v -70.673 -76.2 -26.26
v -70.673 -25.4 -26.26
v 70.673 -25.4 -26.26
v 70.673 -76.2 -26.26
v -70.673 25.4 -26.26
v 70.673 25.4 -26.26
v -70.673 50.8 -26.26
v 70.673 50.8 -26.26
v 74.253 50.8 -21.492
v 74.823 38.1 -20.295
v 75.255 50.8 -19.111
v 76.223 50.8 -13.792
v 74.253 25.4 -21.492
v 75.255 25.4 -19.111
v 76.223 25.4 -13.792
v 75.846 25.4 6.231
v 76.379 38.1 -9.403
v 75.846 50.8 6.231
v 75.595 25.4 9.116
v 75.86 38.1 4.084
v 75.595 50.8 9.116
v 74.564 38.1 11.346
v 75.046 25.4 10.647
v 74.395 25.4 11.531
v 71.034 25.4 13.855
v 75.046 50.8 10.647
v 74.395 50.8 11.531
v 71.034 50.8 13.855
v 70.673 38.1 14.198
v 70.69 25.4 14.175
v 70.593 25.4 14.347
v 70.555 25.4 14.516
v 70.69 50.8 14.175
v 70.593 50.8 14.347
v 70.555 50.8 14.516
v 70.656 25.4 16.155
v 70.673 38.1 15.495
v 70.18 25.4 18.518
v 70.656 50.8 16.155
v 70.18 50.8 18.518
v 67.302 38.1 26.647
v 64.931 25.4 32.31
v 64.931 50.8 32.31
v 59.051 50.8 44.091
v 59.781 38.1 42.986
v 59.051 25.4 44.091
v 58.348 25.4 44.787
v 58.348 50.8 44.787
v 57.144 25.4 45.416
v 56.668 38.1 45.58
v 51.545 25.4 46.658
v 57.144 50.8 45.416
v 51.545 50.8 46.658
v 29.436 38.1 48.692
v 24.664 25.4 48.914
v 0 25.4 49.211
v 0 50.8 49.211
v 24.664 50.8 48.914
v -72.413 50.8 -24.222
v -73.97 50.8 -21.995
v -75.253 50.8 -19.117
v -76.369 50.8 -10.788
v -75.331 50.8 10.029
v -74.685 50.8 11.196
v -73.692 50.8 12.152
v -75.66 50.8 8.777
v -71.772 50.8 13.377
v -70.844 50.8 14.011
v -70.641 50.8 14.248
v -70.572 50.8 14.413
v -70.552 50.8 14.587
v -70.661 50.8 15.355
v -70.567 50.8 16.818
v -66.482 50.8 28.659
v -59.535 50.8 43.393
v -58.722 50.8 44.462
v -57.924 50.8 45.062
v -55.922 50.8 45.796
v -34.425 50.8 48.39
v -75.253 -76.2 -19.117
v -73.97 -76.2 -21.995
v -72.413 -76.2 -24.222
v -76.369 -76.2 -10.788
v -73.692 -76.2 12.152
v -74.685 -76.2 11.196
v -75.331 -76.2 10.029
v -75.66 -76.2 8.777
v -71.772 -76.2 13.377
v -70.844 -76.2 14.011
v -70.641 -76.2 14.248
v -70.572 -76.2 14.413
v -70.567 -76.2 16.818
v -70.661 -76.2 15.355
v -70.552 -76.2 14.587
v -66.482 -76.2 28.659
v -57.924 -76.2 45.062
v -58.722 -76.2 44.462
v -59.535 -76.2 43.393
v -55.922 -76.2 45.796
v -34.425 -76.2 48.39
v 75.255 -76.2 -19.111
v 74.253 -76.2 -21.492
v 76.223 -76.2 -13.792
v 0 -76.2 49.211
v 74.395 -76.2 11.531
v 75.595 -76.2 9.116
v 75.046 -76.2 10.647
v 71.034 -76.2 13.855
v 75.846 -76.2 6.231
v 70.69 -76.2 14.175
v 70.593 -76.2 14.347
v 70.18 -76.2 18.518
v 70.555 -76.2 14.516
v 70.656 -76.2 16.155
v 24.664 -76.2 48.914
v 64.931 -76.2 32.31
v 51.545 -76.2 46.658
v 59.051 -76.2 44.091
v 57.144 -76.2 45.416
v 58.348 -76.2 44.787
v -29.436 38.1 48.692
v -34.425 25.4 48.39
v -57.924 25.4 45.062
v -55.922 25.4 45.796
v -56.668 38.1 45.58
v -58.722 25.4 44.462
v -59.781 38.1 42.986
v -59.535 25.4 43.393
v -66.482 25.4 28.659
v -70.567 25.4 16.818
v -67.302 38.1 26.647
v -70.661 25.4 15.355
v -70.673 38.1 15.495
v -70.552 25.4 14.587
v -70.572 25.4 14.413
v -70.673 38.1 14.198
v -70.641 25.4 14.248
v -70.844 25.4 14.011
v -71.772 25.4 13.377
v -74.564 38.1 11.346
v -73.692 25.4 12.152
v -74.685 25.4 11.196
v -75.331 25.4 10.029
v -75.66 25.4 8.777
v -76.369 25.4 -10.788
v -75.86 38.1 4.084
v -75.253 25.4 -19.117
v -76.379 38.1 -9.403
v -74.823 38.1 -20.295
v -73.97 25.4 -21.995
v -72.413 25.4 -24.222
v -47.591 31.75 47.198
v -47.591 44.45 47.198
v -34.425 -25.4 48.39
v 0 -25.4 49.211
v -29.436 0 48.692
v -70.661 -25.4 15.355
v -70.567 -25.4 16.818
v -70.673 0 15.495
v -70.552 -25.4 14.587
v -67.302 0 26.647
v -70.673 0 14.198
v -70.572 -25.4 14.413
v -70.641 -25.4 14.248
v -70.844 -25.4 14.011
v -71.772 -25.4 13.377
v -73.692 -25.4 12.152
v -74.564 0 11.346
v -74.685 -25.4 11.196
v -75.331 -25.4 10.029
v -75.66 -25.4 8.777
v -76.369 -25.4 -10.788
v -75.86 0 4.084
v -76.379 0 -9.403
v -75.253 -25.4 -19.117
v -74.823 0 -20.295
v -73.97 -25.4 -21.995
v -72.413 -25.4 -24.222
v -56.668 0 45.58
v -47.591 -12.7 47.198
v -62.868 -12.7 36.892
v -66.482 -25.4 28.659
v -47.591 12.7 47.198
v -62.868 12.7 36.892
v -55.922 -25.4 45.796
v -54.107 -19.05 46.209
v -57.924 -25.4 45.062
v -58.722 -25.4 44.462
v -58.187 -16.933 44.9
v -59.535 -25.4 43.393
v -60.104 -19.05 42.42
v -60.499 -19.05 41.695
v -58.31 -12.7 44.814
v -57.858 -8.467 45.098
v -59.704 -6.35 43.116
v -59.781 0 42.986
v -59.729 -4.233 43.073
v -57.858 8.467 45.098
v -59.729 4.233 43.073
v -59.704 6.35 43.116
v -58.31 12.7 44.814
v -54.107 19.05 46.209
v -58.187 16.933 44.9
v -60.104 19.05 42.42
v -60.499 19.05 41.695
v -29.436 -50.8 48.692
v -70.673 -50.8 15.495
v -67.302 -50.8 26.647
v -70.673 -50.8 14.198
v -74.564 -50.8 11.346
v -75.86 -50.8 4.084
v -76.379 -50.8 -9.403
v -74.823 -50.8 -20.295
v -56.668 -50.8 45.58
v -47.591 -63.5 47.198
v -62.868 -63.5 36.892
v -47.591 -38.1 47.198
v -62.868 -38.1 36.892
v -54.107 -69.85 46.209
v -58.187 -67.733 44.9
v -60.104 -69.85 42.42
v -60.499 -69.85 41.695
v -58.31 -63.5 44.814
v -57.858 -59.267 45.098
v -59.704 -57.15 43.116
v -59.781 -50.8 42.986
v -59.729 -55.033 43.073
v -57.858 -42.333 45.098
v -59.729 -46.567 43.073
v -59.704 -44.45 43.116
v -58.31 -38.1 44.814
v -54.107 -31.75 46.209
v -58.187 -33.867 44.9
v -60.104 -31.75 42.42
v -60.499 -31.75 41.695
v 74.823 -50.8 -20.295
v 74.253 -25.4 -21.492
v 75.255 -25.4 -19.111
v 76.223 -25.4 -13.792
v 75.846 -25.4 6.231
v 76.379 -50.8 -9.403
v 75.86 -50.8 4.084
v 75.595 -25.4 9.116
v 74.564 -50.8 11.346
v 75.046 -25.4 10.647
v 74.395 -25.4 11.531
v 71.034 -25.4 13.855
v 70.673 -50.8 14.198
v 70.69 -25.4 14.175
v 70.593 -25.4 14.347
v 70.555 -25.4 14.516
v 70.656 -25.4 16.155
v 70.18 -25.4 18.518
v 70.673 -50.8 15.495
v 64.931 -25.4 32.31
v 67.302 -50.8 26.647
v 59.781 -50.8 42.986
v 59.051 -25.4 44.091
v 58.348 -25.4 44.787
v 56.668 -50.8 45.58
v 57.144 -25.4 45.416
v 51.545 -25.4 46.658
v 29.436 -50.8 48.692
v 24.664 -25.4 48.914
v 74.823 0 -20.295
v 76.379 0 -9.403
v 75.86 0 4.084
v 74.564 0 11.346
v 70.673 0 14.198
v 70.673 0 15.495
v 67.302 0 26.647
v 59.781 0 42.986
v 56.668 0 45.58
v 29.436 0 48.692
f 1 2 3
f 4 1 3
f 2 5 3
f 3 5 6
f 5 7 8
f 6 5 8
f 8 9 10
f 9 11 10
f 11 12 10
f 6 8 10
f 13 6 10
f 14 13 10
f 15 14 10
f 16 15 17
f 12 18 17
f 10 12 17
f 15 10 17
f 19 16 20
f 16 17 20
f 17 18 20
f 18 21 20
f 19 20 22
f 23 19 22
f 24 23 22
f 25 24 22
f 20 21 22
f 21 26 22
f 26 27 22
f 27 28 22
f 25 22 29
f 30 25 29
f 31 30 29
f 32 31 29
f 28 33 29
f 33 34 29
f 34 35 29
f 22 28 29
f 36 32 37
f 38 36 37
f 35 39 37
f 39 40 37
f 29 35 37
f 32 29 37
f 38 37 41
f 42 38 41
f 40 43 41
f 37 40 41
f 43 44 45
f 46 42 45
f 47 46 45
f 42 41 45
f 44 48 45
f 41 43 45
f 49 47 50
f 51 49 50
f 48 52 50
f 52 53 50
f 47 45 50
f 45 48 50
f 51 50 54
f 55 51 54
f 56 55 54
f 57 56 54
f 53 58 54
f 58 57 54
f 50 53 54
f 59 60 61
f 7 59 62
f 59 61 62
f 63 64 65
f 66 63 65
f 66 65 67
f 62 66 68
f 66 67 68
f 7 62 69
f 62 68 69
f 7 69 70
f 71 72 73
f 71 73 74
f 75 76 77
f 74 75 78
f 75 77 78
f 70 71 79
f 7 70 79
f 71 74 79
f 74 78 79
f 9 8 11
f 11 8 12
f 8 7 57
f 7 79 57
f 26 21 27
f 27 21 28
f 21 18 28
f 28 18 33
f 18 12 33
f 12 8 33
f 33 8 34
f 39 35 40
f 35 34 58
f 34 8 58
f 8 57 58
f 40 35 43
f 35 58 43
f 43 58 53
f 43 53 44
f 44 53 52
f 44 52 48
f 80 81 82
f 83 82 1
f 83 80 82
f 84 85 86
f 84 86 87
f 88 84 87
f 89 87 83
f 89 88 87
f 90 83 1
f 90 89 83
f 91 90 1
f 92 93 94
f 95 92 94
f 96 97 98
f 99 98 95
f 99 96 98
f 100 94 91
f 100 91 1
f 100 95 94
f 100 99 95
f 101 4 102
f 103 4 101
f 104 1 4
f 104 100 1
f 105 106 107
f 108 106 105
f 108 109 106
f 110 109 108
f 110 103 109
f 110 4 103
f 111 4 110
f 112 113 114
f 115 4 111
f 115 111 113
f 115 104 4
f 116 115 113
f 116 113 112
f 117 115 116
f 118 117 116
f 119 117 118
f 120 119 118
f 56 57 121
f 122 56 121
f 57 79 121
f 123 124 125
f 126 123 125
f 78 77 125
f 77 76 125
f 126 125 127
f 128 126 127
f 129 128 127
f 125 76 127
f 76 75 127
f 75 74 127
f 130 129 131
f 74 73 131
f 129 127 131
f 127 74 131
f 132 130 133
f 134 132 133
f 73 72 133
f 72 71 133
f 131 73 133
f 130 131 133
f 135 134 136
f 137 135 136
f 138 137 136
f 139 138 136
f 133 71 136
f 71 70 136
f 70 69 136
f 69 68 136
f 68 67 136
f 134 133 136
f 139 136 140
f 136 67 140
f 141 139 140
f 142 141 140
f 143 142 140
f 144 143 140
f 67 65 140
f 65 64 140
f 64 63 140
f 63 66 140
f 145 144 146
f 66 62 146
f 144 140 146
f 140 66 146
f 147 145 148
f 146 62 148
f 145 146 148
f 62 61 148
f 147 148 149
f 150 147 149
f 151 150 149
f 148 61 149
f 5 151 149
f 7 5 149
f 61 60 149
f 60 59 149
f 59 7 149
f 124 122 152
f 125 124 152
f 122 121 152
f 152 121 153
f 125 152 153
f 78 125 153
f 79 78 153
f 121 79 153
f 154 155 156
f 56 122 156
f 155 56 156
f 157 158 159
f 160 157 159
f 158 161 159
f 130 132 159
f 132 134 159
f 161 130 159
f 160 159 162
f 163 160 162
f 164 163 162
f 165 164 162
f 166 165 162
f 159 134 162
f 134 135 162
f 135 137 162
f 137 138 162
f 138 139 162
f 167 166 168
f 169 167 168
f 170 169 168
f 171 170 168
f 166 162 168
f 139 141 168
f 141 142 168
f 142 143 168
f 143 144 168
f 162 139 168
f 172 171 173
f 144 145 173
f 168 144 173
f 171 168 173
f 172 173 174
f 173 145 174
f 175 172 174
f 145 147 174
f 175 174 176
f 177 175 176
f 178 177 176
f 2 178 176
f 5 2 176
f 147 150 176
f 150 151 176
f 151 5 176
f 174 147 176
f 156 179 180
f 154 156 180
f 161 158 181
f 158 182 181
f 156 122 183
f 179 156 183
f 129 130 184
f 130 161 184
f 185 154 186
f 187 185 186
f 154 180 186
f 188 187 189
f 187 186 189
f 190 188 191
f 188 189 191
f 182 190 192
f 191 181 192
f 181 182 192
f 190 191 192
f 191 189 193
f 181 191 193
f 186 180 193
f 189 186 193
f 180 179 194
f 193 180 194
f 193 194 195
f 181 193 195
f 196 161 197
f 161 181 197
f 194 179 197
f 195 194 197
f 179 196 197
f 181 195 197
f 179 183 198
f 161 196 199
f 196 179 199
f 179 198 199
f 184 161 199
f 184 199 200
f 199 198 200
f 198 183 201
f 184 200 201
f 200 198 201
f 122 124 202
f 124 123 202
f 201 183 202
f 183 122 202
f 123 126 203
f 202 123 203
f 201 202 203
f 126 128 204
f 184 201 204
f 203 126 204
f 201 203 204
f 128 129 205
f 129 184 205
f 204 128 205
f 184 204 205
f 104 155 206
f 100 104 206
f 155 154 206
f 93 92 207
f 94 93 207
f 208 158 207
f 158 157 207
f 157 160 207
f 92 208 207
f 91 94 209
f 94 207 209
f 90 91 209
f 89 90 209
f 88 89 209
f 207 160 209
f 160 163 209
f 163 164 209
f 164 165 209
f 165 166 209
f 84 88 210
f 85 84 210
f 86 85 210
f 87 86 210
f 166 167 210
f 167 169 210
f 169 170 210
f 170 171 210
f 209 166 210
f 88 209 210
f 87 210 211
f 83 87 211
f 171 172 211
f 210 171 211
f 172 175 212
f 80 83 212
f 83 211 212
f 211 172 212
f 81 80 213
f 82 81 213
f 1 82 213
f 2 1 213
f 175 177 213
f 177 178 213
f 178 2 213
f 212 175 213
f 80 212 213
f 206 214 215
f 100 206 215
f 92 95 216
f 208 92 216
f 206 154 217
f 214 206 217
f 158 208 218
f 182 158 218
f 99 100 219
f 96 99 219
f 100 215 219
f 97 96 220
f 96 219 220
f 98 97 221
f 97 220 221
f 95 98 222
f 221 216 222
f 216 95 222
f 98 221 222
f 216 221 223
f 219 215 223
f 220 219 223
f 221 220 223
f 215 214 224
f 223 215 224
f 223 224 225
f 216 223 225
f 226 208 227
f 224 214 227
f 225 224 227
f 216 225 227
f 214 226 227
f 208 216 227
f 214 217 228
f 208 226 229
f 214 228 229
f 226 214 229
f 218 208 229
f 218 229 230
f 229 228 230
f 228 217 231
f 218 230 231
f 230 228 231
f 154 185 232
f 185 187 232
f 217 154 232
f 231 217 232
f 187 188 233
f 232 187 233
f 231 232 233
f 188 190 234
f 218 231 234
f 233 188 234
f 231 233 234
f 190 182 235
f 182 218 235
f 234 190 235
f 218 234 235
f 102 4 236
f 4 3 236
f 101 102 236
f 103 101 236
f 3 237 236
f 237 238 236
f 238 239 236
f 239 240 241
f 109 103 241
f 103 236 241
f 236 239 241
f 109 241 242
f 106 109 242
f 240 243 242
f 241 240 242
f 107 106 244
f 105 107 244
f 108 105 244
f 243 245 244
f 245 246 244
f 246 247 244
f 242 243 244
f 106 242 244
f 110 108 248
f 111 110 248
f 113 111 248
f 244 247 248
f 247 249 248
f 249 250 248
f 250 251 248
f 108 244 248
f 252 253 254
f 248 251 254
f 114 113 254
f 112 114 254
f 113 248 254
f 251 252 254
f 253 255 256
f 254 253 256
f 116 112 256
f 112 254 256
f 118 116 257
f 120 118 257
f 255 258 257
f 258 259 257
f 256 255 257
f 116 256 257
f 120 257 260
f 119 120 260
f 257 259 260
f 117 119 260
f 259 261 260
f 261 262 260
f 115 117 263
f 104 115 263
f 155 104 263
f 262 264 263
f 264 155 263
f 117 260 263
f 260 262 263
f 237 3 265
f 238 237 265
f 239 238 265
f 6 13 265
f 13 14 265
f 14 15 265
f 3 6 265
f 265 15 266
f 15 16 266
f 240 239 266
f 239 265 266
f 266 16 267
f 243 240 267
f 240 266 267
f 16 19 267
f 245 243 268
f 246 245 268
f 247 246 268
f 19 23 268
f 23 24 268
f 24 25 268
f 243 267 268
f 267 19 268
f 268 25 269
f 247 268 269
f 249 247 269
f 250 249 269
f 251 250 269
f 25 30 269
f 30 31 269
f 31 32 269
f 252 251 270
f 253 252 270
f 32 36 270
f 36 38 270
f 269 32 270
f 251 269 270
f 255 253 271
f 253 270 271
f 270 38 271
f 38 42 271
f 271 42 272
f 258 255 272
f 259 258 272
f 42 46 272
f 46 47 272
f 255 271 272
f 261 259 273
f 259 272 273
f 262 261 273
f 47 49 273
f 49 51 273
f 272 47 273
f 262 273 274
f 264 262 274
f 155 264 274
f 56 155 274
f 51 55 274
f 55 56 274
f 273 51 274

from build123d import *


with BuildPart() as f5:
    # F2 (on offset) → F5 section 0
    with BuildSketch(Plane.XZ.offset(25.4)):
        with BuildLine():
            Line((-70.6733390689, -26.2604607935), (0, -26.2604607935))
            Line((0, -26.2604607935), (70.6733390689, -26.2604607935))
            add(Edge.make_bspline(
                [(70.6733390689, -26.2604607935), (72.2503747875, -24.4718920492), (75.7680387504, -20.4823921647), (76.7742040767, -9.251150277), (75.574150918, 3.6195758118), (76.1574771859, 11.728830556), (70.0035523206, 13.9218157376), (71.2836195608, 15.8696540221), (67.4313457137, 27.112950519), (60.069760365, 43.2389513494), (56.9439913848, 46.5468555103), (27.3647296132, 49.3101097267), (9.229634278, 49.2443538922), (0, 49.210888267)],
                knots=[0, 0, 0, 0, 0.0747414628, 0.1667148987, 0.2685755434, 0.3438818582, 0.4047813095, 0.4363552858, 0.5309952283, 0.6485879671, 0.7043953518, 0.849555641, 1, 1, 1, 1], degree=3))
            add(Edge.make_bspline(
                [(-70.6733390689, -26.2604607935), (-72.2503747875, -24.4718920492), (-75.7680387504, -20.4823921647), (-76.7742040767, -9.251150277), (-75.574150918, 3.6195758118), (-76.1574771859, 11.728830556), (-70.0035523206, 13.9218157376), (-71.2836195608, 15.8696540221), (-67.4313457137, 27.112950519), (-60.069760365, 43.2389513494), (-56.9439913848, 46.5468555103), (-27.3647296132, 49.3101097267), (-9.229634278, 49.2443538922), (0, 49.210888267)],
                knots=[0, 0, 0, 0, 0.0747414628, 0.1667148987, 0.2685755434, 0.3438818582, 0.4047813095, 0.4363552858, 0.5309952283, 0.6485879671, 0.7043953518, 0.849555641, 1, 1, 1, 1], degree=3))
        make_face()
    # F4 (on Front) → F5 section 1
    with BuildSketch(Plane.XZ):
        with BuildLine():
            Line((-70.6733390689, -26.2604607935), (0, -26.2604607935))
            Line((0, -26.2604607935), (70.6733390689, -26.2604607935))
            add(Edge.make_bspline(
                [(70.6733390689, -26.2604607935), (72.2503747875, -24.4718920492), (75.7680387504, -20.4823921647), (76.7742040767, -9.251150277), (75.574150918, 3.6195758118), (76.1574771859, 11.728830556), (70.0035523206, 13.9218157376), (71.2836195608, 15.8696540221), (67.4313457137, 27.112950519), (60.069760365, 43.2389513494), (56.9439913848, 46.5468555103), (27.3647296132, 49.3101097267), (9.229634278, 49.2443538922), (0, 49.210888267)],
                knots=[0, 0, 0, 0, 0.0747414628, 0.1667148987, 0.2685755434, 0.3438818582, 0.4047813095, 0.4363552858, 0.5309952283, 0.6485879671, 0.7043953518, 0.849555641, 1, 1, 1, 1], degree=3))
            add(Edge.make_bspline(
                [(-70.6733390689, -26.2604607935), (-72.2503747875, -24.4718920492), (-75.7680387504, -20.4823921647), (-76.7742040767, -9.251150277), (-75.574150918, 3.6195758118), (-76.1574771859, 11.728830556), (-70.0035523206, 13.9218157376), (-71.2836195608, 15.8696540221), (-67.4313457137, 27.112950519), (-60.069760365, 43.2389513494), (-56.9439913848, 46.5468555103), (-27.3647296132, 49.3101097267), (-9.229634278, 49.2443538922), (0, 49.210888267)],
                knots=[0, 0, 0, 0, 0.0747414628, 0.1667148987, 0.2685755434, 0.3438818582, 0.4047813095, 0.4363552858, 0.5309952283, 0.6485879671, 0.7043953518, 0.849555641, 1, 1, 1, 1], degree=3))
        make_face()
    # F3 (on offset) → F5 section 2
    with BuildSketch(Plane.XZ.offset(-25.4)):
        with BuildLine():
            Line((-70.6733390689, -26.2604607935), (0, -26.2604607935))
            Line((0, -26.2604607935), (70.6733390689, -26.2604607935))
            add(Edge.make_bspline(
                [(70.6733390689, -26.2604607935), (72.2503747875, -24.4718920492), (75.7680387504, -20.4823921647), (76.7742040767, -9.251150277), (75.574150918, 3.6195758118), (76.1574771859, 11.728830556), (70.0035523206, 13.9218157376), (71.2836195608, 15.8696540221), (67.4313457137, 27.112950519), (60.069760365, 43.2389513494), (56.9439913848, 46.5468555103), (27.3647296132, 49.3101097267), (9.229634278, 49.2443538922), (0, 49.210888267)],
                knots=[0, 0, 0, 0, 0.0747414628, 0.1667148987, 0.2685755434, 0.3438818582, 0.4047813095, 0.4363552858, 0.5309952283, 0.6485879671, 0.7043953518, 0.849555641, 1, 1, 1, 1], degree=3))
            add(Edge.make_bspline(
                [(-70.6733390689, -26.2604607935), (-72.2503747875, -24.4718920492), (-75.7680387504, -20.4823921647), (-76.7742040767, -9.251150277), (-75.574150918, 3.6195758118), (-76.1574771859, 11.728830556), (-70.0035523206, 13.9218157376), (-71.2836195608, 15.8696540221), (-67.4313457137, 27.112950519), (-60.069760365, 43.2389513494), (-56.9439913848, 46.5468555103), (-27.3647296132, 49.3101097267), (-9.229634278, 49.2443538922), (0, 49.210888267)],
                knots=[0, 0, 0, 0, 0.0747414628, 0.1667148987, 0.2685755434, 0.3438818582, 0.4047813095, 0.4363552858, 0.5309952283, 0.6485879671, 0.7043953518, 0.849555641, 1, 1, 1, 1], degree=3))
        make_face()
    loft()

    # F12 (on offset) → F13 section 0
    with BuildSketch(Plane.XZ.offset(76.2)):
        with BuildLine():
            Line((-70.6733390689, -26.2604607935), (0, -26.2604607935))
            Line((0, -26.2604607935), (70.6733390689, -26.2604607935))
            add(Edge.make_bspline(
                [(70.6733390689, -26.2604607935), (72.2503747875, -24.4718920492), (75.7680387504, -20.4823921647), (76.7742040767, -9.251150277), (75.574150918, 3.6195758118), (76.1574771859, 11.728830556), (70.0035523206, 13.9218157376), (71.2836195608, 15.8696540221), (67.4313457137, 27.112950519), (60.069760365, 43.2389513494), (56.9439913848, 46.5468555103), (27.3647296132, 49.3101097267), (9.229634278, 49.2443538922), (0, 49.210888267)],
                knots=[0, 0, 0, 0, 0.0747414628, 0.1667148987, 0.2685755434, 0.3438818582, 0.4047813095, 0.4363552858, 0.5309952283, 0.6485879671, 0.7043953518, 0.849555641, 1, 1, 1, 1], degree=3))
            add(Edge.make_bspline(
                [(-70.6733390689, -26.2604607935), (-72.2503747875, -24.4718920492), (-75.7680387504, -20.4823921647), (-76.7742040767, -9.251150277), (-75.574150918, 3.6195758118), (-76.1574771859, 11.728830556), (-70.0035523206, 13.9218157376), (-71.2836195608, 15.8696540221), (-67.4313457137, 27.112950519), (-60.069760365, 43.2389513494), (-56.9439913848, 46.5468555103), (-27.3647296132, 49.3101097267), (-9.229634278, 49.2443538922), (0, 49.210888267)],
                knots=[0, 0, 0, 0, 0.0747414628, 0.1667148987, 0.2685755434, 0.3438818582, 0.4047813095, 0.4363552858, 0.5309952283, 0.6485879671, 0.7043953518, 0.849555641, 1, 1, 1, 1], degree=3))
        make_face()
    # F9 (on offset) → F13 section 1
    with BuildSketch(Plane.XZ.offset(50.8)):
        with BuildLine():
            Line((-70.6733390689, -26.2604607935), (0, -26.2604607935))
            Line((0, -26.2604607935), (70.6733390689, -26.2604607935))
            add(Edge.make_bspline(
                [(70.6733390689, -26.2604607935), (72.2503747875, -24.4718920492), (75.7680387504, -20.4823921647), (76.7742040767, -9.251150277), (75.574150918, 3.6195758118), (76.1574771859, 11.728830556), (70.0035523206, 13.9218157376), (71.2836195608, 15.8696540221), (67.4313457137, 27.112950519), (60.069760365, 43.2389513494), (56.9439913848, 46.5468555103), (27.3647296132, 49.3101097267), (9.229634278, 49.2443538922), (0, 49.210888267)],
                knots=[0, 0, 0, 0, 0.0747414628, 0.1667148987, 0.2685755434, 0.3438818582, 0.4047813095, 0.4363552858, 0.5309952283, 0.6485879671, 0.7043953518, 0.849555641, 1, 1, 1, 1], degree=3))
            add(Edge.make_bspline(
                [(-70.6733390689, -26.2604607935), (-72.2503747875, -24.4718920492), (-75.7680387504, -20.4823921647), (-76.7742040767, -9.251150277), (-75.574150918, 3.6195758118), (-76.1574771859, 11.728830556), (-70.0035523206, 13.9218157376), (-71.2836195608, 15.8696540221), (-67.4313457137, 27.112950519), (-60.069760365, 43.2389513494), (-56.9439913848, 46.5468555103), (-27.3647296132, 49.3101097267), (-9.229634278, 49.2443538922), (0, 49.210888267)],
                knots=[0, 0, 0, 0, 0.0747414628, 0.1667148987, 0.2685755434, 0.3438818582, 0.4047813095, 0.4363552858, 0.5309952283, 0.6485879671, 0.7043953518, 0.849555641, 1, 1, 1, 1], degree=3))
        make_face()
    # F7 (on offset) → F13 section 2
    with BuildSketch(Plane.XZ.offset(-50.8)):
        with BuildLine():
            Line((-70.6733390689, -26.2604607935), (0, -26.2604607935))
            Line((0, -26.2604607935), (70.6733390689, -26.2604607935))
            add(Edge.make_bspline(
                [(70.6733390689, -26.2604607935), (72.2503747875, -24.4718920492), (75.7680387504, -20.4823921647), (76.7742040767, -9.251150277), (75.574150918, 3.6195758118), (76.1574771859, 11.728830556), (70.0035523206, 13.9218157376), (71.2836195608, 15.8696540221), (67.4313457137, 27.112950519), (60.069760365, 43.2389513494), (56.9439913848, 46.5468555103), (27.3647296132, 49.3101097267), (9.229634278, 49.2443538922), (0, 49.210888267)],
                knots=[0, 0, 0, 0, 0.0747414628, 0.1667148987, 0.2685755434, 0.3438818582, 0.4047813095, 0.4363552858, 0.5309952283, 0.6485879671, 0.7043953518, 0.849555641, 1, 1, 1, 1], degree=3))
            add(Edge.make_bspline(
                [(-70.6733390689, -26.2604607935), (-72.2503747875, -24.4718920492), (-75.7680387504, -20.4823921647), (-76.7742040767, -9.251150277), (-75.574150918, 3.6195758118), (-76.1574771859, 11.728830556), (-70.0035523206, 13.9218157376), (-71.2836195608, 15.8696540221), (-67.4313457137, 27.112950519), (-60.069760365, 43.2389513494), (-56.9439913848, 46.5468555103), (-27.3647296132, 49.3101097267), (-9.229634278, 49.2443538922), (0, 49.210888267)],
                knots=[0, 0, 0, 0, 0.0747414628, 0.1667148987, 0.2685755434, 0.3438818582, 0.4047813095, 0.4363552858, 0.5309952283, 0.6485879671, 0.7043953518, 0.849555641, 1, 1, 1, 1], degree=3))
        make_face()
    loft()


solid = f5.part
